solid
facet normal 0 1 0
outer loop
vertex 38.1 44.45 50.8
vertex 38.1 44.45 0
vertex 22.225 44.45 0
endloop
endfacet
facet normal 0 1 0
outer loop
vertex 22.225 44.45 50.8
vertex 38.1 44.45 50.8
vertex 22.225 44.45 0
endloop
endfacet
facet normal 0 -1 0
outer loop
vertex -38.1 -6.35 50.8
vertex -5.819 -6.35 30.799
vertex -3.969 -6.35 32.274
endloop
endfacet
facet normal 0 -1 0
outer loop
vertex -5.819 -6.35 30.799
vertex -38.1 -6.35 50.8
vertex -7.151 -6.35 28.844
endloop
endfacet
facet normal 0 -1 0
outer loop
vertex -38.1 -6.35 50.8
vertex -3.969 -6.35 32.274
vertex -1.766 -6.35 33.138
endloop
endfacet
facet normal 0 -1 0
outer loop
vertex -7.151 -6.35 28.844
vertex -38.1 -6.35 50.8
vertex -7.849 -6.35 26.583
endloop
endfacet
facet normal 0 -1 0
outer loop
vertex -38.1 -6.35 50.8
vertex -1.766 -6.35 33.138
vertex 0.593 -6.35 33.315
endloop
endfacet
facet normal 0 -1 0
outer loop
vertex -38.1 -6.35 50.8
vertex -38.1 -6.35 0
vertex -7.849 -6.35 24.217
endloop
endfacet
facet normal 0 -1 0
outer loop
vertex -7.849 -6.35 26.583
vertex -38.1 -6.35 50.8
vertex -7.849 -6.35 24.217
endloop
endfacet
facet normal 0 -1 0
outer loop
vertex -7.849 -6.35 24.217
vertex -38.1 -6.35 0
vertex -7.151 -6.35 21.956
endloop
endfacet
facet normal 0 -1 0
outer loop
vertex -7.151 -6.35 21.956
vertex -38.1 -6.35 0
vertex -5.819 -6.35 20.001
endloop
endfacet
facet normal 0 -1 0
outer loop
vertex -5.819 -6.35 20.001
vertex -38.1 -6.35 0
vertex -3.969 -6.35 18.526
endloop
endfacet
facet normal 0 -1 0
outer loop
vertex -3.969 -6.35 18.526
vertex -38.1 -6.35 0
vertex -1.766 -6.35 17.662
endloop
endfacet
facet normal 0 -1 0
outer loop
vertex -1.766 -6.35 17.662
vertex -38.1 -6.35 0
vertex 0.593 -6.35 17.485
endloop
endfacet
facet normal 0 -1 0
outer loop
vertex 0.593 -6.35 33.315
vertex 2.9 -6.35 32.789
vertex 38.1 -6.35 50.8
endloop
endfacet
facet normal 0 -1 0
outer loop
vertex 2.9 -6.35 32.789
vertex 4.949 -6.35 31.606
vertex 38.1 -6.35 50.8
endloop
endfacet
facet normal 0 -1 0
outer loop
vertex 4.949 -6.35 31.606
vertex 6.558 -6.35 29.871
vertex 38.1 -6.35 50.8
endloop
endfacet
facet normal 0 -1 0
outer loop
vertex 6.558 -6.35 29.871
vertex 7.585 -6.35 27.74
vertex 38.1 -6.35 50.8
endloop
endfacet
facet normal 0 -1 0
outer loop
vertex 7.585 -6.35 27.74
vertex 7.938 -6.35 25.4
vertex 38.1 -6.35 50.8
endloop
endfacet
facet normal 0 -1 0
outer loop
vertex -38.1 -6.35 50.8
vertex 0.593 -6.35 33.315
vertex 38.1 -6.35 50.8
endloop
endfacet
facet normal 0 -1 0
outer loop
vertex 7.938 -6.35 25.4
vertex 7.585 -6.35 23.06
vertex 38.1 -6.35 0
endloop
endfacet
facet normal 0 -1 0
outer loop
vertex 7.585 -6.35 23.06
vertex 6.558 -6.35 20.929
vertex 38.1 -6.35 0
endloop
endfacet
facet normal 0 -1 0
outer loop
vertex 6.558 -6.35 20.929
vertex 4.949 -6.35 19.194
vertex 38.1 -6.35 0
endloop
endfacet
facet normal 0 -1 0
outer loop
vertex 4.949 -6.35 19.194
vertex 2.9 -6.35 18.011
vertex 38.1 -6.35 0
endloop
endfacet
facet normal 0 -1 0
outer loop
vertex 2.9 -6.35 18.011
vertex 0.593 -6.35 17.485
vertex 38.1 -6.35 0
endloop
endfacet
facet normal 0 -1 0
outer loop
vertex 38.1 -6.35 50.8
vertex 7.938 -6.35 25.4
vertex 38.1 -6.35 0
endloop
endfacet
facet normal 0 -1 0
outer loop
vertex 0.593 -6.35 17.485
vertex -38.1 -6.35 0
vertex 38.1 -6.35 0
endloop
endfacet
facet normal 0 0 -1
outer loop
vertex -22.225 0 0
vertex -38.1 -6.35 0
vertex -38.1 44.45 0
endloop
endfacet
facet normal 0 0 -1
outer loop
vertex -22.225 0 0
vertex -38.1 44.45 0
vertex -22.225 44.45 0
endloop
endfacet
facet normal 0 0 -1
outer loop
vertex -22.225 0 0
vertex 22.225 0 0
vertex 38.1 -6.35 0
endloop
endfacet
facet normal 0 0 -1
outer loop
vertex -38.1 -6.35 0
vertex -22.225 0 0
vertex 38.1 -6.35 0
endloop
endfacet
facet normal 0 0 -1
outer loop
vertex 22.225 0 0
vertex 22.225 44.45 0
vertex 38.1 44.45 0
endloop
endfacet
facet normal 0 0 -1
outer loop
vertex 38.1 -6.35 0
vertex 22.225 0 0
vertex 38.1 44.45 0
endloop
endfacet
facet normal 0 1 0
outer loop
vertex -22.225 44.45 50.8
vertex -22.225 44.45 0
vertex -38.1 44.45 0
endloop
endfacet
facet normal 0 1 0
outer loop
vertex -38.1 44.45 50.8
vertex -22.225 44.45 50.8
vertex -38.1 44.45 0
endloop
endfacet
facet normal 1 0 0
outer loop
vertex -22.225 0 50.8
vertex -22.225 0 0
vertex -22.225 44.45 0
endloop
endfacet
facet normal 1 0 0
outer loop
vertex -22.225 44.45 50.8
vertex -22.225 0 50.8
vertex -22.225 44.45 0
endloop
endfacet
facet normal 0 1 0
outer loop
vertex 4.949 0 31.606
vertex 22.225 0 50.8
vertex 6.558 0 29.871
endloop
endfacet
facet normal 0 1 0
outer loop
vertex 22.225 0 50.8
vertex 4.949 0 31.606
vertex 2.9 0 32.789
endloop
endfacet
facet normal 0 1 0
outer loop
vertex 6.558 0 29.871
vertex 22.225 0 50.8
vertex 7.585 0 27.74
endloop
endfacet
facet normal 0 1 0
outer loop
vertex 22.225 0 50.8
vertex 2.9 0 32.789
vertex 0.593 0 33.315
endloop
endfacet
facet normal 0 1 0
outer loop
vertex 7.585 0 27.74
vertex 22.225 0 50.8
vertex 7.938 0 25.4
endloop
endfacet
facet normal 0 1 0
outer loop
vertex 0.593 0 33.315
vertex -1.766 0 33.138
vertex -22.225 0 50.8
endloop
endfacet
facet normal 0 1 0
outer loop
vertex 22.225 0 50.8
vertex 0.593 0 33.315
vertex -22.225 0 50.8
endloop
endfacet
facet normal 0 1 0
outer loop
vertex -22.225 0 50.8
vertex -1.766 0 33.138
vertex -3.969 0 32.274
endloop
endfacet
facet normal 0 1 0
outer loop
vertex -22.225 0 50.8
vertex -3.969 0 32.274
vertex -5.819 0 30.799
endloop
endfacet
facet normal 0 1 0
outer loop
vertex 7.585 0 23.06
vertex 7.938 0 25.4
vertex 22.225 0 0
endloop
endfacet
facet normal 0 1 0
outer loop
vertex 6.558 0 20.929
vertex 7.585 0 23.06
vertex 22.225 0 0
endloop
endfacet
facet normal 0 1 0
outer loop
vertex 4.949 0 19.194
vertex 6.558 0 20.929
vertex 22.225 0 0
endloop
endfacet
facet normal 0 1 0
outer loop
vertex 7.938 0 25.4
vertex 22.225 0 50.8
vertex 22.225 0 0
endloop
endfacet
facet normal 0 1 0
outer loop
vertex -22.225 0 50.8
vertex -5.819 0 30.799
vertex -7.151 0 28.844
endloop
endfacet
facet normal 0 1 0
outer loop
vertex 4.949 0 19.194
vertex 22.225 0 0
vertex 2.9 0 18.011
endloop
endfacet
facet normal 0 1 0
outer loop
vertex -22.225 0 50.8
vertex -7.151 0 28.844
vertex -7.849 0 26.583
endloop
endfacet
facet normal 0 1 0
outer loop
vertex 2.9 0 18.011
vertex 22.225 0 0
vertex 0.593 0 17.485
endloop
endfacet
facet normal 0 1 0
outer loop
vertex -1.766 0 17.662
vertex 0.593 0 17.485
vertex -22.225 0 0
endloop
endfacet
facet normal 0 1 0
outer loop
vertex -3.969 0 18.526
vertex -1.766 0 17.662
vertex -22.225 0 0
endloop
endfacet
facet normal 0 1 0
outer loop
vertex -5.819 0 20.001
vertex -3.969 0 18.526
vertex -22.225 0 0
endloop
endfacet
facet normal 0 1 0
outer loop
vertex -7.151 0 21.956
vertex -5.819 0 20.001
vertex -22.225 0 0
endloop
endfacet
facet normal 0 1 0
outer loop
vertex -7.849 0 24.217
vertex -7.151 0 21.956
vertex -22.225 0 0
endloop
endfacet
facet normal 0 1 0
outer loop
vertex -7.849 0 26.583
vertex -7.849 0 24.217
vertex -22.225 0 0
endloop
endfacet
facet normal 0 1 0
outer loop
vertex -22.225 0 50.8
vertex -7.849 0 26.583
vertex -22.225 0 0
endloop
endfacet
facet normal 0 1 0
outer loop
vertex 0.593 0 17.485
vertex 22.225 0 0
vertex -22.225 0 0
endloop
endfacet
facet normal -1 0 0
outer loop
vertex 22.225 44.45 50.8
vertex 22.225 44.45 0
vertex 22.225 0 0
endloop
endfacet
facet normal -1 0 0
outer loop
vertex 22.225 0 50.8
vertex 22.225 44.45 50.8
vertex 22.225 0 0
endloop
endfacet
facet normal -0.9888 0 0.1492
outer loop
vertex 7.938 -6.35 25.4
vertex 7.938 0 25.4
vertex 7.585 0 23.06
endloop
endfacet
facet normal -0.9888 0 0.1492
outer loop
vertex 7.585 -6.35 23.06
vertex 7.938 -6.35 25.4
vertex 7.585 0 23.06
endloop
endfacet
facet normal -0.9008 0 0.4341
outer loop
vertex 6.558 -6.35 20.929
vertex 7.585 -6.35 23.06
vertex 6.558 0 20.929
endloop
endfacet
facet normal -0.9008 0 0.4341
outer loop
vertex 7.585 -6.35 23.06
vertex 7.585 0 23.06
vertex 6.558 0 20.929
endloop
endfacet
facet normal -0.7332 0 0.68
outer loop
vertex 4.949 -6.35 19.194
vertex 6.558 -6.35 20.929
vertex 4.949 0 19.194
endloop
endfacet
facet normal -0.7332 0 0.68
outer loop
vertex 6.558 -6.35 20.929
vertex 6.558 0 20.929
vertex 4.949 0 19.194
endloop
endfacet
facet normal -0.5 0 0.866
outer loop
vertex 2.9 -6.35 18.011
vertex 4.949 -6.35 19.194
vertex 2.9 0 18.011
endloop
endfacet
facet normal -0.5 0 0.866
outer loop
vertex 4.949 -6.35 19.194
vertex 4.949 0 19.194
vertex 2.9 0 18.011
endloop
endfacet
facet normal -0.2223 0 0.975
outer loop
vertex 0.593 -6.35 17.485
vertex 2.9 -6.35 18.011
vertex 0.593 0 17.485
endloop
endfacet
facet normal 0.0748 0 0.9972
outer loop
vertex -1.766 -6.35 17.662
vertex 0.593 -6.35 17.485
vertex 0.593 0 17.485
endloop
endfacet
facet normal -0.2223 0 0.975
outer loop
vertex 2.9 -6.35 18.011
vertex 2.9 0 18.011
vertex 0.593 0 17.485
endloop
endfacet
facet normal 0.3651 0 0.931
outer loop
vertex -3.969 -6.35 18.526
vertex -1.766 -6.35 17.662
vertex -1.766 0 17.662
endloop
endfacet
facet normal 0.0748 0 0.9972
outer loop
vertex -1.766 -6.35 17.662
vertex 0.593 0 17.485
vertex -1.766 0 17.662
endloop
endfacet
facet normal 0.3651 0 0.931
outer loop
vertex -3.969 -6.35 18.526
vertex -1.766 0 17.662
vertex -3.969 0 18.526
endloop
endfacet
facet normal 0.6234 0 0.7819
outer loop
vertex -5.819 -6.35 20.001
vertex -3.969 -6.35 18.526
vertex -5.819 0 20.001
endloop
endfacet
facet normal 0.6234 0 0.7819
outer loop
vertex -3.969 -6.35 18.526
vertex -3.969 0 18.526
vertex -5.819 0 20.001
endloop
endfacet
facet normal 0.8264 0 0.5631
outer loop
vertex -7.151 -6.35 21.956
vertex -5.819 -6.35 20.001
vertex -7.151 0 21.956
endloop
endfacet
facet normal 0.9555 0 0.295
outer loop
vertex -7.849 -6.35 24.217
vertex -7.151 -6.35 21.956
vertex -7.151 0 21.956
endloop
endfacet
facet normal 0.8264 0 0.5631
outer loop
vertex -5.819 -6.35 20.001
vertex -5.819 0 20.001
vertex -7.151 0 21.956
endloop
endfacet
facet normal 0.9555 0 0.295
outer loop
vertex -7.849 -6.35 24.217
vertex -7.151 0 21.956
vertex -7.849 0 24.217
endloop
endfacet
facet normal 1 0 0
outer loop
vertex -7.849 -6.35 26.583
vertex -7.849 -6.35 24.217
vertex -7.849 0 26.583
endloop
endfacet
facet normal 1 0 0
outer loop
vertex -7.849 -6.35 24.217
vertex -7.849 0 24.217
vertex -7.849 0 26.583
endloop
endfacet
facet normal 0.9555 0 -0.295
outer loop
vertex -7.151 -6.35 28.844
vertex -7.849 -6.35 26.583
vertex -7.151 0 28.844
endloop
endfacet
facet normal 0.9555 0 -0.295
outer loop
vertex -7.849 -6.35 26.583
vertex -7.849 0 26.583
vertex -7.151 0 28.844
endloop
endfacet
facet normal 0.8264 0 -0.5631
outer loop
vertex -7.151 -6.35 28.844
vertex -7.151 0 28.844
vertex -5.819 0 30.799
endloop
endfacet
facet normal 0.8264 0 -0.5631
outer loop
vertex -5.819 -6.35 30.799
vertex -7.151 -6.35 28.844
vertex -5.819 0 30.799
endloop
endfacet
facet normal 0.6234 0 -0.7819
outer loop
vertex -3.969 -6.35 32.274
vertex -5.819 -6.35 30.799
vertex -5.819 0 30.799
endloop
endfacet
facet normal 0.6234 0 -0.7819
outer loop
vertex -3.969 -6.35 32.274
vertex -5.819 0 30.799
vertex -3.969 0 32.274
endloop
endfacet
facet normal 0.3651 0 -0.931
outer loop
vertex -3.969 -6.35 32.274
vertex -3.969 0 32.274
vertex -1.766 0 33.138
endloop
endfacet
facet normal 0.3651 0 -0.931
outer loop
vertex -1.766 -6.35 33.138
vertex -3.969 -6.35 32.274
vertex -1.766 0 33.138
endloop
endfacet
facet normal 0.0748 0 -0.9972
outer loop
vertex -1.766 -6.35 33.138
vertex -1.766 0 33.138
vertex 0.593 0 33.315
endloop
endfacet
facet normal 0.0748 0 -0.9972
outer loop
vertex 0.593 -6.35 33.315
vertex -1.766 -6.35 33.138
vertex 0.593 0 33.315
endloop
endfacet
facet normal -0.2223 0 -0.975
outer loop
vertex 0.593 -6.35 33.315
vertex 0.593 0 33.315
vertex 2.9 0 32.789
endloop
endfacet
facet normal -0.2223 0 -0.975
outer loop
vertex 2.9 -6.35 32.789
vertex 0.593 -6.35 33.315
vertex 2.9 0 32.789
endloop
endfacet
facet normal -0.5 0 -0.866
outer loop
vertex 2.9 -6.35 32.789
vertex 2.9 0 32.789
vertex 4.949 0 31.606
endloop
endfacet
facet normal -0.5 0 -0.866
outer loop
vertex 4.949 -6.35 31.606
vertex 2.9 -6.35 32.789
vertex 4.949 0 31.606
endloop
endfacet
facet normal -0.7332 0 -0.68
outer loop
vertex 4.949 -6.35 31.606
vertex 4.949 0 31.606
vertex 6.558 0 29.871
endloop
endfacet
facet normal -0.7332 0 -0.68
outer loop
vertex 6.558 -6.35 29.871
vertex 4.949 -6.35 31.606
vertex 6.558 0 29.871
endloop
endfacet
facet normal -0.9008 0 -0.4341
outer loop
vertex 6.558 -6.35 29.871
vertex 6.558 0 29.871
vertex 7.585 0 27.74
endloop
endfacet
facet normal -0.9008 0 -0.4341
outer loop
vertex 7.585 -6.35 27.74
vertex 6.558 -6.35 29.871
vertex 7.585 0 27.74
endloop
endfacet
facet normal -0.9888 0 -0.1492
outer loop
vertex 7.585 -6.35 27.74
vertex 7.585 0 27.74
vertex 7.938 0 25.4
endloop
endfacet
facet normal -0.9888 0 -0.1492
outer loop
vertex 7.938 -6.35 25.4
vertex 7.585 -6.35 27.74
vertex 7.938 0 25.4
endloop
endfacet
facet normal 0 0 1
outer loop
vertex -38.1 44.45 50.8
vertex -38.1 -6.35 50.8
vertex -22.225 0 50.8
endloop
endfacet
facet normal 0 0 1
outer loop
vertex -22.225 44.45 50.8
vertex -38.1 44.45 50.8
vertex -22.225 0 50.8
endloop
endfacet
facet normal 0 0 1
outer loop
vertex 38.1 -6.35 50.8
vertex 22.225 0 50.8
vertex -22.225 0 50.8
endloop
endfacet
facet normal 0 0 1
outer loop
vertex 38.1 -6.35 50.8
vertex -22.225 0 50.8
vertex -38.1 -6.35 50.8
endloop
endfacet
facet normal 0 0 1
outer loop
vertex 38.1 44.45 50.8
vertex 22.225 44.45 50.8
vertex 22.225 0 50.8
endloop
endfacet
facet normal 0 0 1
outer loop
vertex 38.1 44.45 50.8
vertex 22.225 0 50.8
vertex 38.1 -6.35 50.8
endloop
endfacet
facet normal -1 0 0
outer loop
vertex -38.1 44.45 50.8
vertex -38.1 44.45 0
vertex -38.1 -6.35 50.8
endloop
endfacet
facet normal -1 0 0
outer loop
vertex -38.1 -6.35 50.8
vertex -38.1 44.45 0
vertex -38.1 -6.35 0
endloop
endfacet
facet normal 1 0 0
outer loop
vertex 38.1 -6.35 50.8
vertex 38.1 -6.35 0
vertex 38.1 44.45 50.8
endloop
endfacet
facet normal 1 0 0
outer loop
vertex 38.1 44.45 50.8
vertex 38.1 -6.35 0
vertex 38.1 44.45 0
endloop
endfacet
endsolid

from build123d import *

# Parameters (mm, degrees)
BOSS_EXTRUDE1_DEPTH = 50.8
SKETCH2_R           = 7.9375
CUT_EXTRUDE1_DEPTH  = 7.35


with BuildPart() as part:
    # Sketch1 → Boss-Extrude1 (new body)
    with BuildSketch(Plane.XY):
        Polygon((22.225, 0), (-22.225, 0), (-22.225, 44.45), (-38.1, 44.45), (-38.1, -6.35), (38.1, -6.35), (38.1, 44.45), (22.225, 44.45), align=None)
    extrude(amount=BOSS_EXTRUDE1_DEPTH)

    # Sketch2 → Cut-Extrude1 (cut, through all)
    with BuildSketch(Plane(origin=(0, 0, 0), x_dir=(1, 0, 0), z_dir=(0, 1, 0))):
        with Locations((0, -25.4)):
            Circle(SKETCH2_R)
    extrude(amount=-CUT_EXTRUDE1_DEPTH, mode=Mode.SUBTRACT)


solid = part.part
